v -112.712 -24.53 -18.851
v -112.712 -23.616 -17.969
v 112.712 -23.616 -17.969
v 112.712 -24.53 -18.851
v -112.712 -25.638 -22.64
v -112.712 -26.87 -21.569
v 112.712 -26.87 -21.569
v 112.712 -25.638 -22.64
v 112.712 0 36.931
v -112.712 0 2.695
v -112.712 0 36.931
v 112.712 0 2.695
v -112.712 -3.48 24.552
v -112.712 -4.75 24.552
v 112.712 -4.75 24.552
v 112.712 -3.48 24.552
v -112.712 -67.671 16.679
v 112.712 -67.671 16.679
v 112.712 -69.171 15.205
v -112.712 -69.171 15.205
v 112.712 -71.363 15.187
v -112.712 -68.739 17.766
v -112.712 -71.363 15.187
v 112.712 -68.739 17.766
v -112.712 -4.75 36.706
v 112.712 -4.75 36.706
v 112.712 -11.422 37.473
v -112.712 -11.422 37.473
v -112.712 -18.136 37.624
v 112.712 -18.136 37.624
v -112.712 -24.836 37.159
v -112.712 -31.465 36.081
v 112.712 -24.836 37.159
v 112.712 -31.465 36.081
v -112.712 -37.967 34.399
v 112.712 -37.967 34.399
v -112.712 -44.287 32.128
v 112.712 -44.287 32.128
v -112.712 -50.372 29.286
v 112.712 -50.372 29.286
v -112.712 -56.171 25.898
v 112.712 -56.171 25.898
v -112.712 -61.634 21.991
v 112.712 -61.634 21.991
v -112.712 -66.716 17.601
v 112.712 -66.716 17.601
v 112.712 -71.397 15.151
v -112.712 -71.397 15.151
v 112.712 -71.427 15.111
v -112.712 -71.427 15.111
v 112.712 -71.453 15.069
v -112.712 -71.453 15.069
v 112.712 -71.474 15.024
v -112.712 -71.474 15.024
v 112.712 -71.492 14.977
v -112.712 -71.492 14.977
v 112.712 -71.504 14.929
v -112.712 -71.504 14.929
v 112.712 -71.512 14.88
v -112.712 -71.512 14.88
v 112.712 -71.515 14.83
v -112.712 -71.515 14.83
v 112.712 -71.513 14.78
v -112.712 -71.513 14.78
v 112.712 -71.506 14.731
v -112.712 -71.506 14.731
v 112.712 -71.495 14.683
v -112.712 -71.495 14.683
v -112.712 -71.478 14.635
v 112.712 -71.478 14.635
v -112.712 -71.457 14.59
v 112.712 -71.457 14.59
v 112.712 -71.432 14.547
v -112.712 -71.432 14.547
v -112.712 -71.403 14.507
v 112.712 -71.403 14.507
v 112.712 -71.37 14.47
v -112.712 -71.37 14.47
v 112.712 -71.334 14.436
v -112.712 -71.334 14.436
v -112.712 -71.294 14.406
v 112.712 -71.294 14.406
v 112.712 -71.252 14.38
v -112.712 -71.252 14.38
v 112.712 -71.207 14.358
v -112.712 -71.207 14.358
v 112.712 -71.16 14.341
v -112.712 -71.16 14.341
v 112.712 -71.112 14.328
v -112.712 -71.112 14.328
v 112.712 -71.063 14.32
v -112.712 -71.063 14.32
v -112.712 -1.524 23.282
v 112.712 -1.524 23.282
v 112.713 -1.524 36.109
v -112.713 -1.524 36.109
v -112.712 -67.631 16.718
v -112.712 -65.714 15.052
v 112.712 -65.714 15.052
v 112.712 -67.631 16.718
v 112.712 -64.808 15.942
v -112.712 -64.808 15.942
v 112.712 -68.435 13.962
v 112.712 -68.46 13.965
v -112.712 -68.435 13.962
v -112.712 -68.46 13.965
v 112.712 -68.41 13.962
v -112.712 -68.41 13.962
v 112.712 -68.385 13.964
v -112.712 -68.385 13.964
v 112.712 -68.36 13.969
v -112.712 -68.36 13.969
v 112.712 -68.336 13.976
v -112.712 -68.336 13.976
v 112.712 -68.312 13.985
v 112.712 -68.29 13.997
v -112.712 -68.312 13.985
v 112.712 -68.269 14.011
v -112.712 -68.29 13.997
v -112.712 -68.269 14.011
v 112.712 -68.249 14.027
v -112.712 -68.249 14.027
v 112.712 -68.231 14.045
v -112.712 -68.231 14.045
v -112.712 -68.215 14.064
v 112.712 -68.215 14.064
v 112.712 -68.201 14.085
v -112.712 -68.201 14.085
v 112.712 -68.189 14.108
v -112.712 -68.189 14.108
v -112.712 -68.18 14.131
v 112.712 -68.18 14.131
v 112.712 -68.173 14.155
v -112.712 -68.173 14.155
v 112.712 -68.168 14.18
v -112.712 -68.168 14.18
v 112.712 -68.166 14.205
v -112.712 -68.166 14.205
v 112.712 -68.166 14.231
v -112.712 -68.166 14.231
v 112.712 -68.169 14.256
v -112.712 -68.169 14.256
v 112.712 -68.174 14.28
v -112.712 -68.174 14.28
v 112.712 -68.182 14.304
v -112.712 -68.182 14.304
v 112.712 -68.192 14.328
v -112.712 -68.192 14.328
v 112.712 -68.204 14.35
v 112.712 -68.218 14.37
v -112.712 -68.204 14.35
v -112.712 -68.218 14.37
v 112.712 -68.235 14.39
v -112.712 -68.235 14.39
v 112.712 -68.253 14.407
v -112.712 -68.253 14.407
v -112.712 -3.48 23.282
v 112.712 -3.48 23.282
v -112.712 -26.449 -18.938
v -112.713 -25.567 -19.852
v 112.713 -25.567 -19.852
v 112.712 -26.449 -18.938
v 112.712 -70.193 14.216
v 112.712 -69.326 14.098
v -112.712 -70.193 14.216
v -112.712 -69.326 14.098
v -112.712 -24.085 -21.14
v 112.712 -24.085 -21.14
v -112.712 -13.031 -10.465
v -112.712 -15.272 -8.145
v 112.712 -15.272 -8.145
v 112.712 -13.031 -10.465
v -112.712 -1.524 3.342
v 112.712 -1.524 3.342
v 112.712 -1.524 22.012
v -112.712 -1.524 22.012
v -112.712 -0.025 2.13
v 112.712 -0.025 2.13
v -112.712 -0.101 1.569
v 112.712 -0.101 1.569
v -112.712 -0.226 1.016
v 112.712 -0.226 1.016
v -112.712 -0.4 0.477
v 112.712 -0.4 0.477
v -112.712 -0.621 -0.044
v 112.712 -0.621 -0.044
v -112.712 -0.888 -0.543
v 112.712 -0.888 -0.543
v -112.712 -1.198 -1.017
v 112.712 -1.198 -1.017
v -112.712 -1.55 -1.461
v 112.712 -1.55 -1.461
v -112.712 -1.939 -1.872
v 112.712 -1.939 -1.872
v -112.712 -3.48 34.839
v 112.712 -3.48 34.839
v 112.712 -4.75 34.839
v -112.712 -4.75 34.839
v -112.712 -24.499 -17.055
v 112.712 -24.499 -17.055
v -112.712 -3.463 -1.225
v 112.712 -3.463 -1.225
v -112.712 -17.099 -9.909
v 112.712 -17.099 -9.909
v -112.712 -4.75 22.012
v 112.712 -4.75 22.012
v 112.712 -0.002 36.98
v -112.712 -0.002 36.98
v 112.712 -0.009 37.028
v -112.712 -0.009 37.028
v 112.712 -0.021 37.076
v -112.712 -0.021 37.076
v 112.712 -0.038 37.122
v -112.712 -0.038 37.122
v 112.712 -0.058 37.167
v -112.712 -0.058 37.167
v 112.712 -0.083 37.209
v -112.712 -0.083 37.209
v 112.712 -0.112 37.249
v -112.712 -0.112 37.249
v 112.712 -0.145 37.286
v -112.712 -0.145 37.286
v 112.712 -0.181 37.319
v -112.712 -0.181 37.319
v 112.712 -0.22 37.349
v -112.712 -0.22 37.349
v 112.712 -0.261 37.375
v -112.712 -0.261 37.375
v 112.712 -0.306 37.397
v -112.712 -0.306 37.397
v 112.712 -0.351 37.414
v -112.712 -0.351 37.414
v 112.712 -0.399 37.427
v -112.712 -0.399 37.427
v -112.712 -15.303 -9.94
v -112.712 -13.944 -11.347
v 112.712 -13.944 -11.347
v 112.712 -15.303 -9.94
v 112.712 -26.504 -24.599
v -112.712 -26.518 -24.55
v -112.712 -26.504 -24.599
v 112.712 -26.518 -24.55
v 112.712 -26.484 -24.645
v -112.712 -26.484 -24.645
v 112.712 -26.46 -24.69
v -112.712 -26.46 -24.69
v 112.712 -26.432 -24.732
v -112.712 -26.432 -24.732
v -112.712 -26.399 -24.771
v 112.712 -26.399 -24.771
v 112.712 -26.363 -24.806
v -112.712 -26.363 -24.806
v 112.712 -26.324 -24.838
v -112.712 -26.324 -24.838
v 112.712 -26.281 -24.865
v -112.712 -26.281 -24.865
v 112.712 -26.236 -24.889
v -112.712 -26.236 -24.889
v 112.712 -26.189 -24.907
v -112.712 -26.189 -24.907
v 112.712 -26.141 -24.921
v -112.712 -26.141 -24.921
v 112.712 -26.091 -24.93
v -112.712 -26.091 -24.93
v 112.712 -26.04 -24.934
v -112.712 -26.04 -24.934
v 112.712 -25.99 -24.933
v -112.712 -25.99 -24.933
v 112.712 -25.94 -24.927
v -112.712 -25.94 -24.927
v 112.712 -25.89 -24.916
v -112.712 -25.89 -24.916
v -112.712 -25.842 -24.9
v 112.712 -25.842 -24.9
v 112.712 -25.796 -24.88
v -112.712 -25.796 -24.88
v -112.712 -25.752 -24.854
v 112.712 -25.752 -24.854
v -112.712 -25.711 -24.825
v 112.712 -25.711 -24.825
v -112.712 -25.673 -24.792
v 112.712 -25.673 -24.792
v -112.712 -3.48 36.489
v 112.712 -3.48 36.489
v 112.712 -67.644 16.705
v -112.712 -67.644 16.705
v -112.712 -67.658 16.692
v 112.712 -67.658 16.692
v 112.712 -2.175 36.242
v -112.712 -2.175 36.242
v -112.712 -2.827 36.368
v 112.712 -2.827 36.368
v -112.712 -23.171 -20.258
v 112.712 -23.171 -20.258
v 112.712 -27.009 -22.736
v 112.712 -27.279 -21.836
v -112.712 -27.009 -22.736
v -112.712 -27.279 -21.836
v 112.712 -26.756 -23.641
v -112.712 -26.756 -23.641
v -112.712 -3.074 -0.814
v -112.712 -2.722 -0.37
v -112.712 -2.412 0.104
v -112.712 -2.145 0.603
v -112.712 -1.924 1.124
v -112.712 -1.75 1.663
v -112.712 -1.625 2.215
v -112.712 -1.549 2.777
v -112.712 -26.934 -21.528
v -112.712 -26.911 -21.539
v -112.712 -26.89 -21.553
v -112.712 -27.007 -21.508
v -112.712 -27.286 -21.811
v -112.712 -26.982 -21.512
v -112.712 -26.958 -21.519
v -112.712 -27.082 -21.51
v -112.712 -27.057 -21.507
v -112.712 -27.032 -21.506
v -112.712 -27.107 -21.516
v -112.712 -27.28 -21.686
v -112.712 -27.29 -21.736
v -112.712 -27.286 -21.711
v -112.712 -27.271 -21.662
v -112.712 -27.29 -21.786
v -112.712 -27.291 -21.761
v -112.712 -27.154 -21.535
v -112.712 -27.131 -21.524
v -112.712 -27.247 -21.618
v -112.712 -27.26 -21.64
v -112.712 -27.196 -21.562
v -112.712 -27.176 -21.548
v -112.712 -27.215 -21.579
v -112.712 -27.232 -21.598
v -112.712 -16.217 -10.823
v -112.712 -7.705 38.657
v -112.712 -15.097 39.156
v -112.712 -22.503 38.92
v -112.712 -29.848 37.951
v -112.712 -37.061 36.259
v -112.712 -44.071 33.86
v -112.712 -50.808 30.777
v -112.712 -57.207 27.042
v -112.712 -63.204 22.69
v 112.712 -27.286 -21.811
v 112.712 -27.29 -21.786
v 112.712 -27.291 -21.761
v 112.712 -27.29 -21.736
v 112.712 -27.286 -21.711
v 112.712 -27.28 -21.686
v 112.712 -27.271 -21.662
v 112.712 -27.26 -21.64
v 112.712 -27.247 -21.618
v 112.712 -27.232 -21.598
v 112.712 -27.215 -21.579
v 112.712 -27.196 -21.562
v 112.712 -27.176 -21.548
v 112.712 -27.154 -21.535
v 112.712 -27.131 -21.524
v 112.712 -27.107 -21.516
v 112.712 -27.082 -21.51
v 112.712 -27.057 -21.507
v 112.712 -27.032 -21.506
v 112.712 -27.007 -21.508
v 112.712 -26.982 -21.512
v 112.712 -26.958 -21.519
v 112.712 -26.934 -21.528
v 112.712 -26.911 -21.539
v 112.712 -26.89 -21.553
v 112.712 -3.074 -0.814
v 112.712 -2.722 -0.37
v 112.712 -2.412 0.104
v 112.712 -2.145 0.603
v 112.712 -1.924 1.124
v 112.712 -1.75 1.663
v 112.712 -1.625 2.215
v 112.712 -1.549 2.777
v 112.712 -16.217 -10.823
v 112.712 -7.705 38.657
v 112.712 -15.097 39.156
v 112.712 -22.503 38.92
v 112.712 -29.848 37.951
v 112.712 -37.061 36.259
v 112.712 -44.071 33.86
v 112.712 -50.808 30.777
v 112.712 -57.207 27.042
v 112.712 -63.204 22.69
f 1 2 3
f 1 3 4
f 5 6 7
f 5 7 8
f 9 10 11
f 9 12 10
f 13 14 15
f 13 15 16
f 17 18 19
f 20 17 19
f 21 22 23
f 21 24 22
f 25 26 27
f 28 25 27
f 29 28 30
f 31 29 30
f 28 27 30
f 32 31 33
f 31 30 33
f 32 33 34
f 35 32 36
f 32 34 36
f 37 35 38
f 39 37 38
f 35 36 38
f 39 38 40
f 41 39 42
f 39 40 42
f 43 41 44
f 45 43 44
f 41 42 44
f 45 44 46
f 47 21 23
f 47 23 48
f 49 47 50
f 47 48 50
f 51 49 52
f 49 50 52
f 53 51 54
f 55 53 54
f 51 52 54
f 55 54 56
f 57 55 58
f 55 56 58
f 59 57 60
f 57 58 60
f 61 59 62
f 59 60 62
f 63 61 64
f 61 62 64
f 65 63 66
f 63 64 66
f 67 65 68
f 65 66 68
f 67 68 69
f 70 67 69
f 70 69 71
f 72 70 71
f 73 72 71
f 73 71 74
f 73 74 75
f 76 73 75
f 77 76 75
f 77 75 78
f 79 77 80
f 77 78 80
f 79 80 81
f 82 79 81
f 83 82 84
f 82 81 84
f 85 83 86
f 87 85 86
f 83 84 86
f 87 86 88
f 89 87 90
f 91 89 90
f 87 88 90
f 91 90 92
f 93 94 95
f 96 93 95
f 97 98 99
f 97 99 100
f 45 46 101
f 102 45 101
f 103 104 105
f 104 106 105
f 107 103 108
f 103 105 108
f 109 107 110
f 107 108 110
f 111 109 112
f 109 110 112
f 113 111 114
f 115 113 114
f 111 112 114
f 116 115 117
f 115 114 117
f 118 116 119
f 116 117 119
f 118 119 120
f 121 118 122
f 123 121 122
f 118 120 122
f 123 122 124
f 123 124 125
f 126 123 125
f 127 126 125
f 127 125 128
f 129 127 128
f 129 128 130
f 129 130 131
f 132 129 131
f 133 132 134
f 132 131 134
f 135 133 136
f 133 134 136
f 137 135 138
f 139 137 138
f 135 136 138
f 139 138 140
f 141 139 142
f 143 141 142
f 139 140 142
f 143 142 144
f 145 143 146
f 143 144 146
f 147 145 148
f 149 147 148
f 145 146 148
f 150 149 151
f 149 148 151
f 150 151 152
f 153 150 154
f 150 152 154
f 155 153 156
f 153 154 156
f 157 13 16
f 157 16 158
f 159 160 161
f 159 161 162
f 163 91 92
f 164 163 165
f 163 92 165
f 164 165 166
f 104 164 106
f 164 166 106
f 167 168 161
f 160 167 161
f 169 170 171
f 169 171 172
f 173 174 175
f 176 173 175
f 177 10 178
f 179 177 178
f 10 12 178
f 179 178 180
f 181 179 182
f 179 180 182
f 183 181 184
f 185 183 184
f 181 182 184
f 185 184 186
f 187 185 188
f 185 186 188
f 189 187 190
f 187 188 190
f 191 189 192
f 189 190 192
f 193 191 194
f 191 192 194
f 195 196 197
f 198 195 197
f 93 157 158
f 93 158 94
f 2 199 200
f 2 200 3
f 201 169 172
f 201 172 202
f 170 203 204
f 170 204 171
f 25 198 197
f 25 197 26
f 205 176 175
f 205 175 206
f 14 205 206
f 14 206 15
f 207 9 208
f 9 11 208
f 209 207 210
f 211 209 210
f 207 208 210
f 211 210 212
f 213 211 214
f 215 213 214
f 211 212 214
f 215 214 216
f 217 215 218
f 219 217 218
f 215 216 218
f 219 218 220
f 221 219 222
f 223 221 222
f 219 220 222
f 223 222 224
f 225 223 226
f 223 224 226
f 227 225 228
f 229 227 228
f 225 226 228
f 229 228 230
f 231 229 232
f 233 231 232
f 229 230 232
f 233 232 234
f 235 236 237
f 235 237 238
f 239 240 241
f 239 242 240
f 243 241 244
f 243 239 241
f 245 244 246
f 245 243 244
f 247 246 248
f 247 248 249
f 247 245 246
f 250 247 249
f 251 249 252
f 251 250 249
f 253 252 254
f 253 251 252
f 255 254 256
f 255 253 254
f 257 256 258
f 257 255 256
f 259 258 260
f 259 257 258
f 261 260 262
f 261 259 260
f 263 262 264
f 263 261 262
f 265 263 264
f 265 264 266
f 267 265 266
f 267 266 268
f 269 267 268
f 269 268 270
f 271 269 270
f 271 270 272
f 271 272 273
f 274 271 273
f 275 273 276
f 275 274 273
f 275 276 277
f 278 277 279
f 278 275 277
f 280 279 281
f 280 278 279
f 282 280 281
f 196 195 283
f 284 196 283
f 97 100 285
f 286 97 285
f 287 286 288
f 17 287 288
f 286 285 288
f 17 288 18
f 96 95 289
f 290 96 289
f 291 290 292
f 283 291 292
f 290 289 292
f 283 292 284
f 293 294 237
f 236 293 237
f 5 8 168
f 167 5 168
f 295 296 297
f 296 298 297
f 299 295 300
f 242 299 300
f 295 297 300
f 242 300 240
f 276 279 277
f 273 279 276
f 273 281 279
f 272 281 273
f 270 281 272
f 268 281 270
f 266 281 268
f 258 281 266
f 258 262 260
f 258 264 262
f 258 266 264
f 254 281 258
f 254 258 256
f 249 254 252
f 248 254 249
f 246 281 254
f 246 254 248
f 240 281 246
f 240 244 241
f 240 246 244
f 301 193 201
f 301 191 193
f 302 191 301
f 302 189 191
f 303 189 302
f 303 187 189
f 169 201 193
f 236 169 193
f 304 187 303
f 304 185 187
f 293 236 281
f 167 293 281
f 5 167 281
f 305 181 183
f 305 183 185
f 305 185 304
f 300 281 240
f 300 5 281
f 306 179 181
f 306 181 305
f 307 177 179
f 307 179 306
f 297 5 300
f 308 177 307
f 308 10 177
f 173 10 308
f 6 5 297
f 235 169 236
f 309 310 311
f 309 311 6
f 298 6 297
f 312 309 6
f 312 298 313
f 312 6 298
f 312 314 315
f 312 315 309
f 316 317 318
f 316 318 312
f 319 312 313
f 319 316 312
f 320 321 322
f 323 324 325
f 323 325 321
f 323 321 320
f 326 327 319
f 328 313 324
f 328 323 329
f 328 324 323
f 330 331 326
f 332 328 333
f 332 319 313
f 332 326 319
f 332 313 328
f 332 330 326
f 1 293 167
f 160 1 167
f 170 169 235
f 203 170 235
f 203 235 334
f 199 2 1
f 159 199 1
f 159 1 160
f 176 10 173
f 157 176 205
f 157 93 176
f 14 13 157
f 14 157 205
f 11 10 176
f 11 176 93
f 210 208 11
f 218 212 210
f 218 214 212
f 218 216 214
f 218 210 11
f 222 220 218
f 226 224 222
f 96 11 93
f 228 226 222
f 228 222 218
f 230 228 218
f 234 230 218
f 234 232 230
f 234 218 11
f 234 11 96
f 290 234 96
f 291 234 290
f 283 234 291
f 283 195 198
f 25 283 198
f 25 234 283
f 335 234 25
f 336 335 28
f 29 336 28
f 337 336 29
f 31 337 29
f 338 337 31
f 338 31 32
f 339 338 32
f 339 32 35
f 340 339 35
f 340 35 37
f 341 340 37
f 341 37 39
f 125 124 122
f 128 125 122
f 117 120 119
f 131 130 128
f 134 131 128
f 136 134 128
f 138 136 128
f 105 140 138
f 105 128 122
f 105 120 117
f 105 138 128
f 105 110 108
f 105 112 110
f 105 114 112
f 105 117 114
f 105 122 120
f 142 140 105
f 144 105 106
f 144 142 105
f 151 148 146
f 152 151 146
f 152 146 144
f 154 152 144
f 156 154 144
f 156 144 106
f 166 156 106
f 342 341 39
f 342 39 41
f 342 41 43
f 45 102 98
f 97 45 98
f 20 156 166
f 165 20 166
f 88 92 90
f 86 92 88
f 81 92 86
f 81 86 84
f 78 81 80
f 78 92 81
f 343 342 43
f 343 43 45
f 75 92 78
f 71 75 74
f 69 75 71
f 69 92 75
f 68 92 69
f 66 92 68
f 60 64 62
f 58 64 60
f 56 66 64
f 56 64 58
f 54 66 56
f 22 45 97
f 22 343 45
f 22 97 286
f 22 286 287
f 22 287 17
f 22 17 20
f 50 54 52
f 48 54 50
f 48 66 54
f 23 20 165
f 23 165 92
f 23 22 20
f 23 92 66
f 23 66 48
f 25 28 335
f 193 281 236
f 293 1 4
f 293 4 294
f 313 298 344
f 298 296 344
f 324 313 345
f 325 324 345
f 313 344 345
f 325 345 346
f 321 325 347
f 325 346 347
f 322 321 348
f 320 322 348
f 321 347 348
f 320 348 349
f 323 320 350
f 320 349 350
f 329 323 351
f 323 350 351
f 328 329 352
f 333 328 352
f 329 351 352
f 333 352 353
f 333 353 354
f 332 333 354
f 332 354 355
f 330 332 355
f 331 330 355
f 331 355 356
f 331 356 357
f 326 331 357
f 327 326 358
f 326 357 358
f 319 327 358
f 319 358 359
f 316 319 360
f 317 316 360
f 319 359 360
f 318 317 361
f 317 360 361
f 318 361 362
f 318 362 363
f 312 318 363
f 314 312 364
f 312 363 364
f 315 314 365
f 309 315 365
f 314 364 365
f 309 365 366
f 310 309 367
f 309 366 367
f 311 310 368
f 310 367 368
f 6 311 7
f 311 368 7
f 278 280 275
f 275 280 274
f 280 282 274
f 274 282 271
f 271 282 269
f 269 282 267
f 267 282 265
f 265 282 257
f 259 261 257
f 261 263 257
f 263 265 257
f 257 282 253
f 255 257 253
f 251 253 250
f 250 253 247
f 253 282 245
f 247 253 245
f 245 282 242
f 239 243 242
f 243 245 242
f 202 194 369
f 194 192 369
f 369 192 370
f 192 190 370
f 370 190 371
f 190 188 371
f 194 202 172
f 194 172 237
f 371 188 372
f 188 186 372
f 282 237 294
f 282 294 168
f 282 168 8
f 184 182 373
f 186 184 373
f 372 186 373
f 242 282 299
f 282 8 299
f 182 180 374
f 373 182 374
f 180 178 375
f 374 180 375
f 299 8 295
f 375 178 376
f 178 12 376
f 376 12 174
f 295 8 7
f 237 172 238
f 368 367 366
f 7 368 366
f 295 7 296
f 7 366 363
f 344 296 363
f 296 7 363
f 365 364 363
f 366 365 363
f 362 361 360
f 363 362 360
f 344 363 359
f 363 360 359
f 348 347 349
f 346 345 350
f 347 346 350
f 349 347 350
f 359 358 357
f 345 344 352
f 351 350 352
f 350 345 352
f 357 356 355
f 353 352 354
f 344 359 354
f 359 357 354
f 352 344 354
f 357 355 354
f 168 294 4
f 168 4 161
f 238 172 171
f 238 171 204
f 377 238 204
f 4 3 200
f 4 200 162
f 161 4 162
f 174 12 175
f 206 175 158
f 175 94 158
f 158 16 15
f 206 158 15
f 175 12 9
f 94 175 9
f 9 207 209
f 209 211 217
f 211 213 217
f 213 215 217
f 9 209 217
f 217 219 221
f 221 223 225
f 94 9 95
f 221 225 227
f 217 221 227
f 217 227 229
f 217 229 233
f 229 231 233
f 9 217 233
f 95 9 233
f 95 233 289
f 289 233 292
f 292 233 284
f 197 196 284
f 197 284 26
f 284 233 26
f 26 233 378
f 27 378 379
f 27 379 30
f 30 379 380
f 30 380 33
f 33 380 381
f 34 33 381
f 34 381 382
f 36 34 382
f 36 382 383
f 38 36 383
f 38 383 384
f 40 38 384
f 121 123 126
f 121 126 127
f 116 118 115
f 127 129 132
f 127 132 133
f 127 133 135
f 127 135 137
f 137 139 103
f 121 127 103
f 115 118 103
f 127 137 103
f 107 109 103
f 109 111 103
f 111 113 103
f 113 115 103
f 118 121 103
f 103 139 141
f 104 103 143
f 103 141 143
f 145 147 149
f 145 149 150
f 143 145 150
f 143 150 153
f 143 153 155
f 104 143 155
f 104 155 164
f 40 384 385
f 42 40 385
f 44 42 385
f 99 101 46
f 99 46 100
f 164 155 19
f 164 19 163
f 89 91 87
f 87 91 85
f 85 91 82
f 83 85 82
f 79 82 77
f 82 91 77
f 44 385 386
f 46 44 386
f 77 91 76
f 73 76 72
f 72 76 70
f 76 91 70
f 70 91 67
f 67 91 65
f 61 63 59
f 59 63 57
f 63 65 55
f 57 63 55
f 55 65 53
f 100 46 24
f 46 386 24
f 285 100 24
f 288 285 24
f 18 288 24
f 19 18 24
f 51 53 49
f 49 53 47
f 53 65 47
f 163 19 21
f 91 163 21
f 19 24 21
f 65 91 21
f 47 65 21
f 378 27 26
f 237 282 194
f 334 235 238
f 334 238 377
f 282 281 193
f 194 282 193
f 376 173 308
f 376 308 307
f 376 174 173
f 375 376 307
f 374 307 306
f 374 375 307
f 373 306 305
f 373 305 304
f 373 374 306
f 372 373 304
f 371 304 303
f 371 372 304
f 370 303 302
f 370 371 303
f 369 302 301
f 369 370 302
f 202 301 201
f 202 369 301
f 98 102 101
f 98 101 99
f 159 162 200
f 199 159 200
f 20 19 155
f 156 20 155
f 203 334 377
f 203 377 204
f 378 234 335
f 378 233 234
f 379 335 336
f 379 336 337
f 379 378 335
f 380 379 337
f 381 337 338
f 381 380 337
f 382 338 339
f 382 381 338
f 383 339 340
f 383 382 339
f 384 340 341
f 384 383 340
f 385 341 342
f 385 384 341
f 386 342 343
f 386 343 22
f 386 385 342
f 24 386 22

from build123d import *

# Parameters (mm, degrees)
F1_DEPTH  = 112.7125
F2_T      = -1.524
F5_DEPTH  = 225.425
F7_DEPTH  = 225.425
F8_R      = 51.8099901909
F9_DEPTH  = 225.425
F14_W     = 1.27
F14_H     = 1.8664713708
F15_DEPTH = 225.425
F16_R     = 0.508
F17_R     = 6.35
F18_R     = 0.254


with BuildPart() as f1:
    # F0 (on Right) → F1 (new body, symmetric)
    with BuildSketch(Plane.YZ):
        with BuildLine():
            Line((-72.136, 14.4276117903), (-26.3105725372, -25.4078245579))
            Line((-26.3105725372, -25.4078245579), (0, 0))
            Line((0, 0), (0, 37.338))
            ThreePointArc((0, 37.338), (-36.8647965725, 36.3151722047), (-68.7392263709, 17.7657752319))
            Line((-68.7392263709, 17.7657752319), (-72.136, 14.4276117903))
        make_face()
    extrude(amount=F1_DEPTH, both=True)

    # F2
    f2_openings = [f1.faces().sort_by_distance(p)[0] for p in [
        (0, -49.223286, -5.490106),
        (-112.7125, -29.609995, 11.681685),
        (112.7125, -29.609995, 11.681685),
    ]]
    offset(amount=F2_T, openings=f2_openings)

    # F4 (on face) → F5 (join, through all)
    with BuildSketch(Plane(origin=(-112.7125, 0, 0), x_dir=(0, -1, 0), z_dir=(-1, 0, 0))):
        Polygon((69.0653059094, 11.7582981414), (70.9822682431, 13.424688075), (69.170655641, 15.2050419106), (67.2536933072, 13.5386519769), align=None)
    extrude(amount=-F5_DEPTH)

    # F6 (on face) → F7 (join, through all)
    with BuildSketch(Plane(origin=(-112.7125, 0, 0), x_dir=(0, -1, 0), z_dir=(-1, 0, 0))):
        Polygon((27.5549826692, -20.9733491998), (25.6380203354, -22.6397391335), (27.4651434283, -24.4041713944), (29.382105762, -22.7377814608), align=None)
    extrude(amount=-F7_DEPTH)

    # F8 (on face) → F9 (cut, through all)
    with BuildSketch(Plane(origin=(-112.7125, 0, 0), x_dir=(0, -1, 0), z_dir=(-1, 0, 0))):
        with Locations((76.7665722185, -37.1750323717)):
            Circle(F8_R)
    extrude(amount=-F9_DEPTH, mode=Mode.SUBTRACT)

    # F10 (on face) + F11 (on face) + F12 (on face) + F13 (on face) + F14 (on face) → F15 (join, through all)
    with BuildSketch(Plane(origin=(-112.7125, 0, 0), x_dir=(0, -1, 0), z_dir=(-1, 0, 0))):
        Polygon((23.17140416, -20.2577555812), (24.0849657065, -21.1399717116), (25.5666650167, -19.8519501518), (24.530017001, -18.8508707997), align=None)
    with BuildSketch(Plane(origin=(-112.7125, 0, 0), x_dir=(0, -1, 0), z_dir=(-1, 0, 0))):
        Polygon((23.6164554546, -17.9686546692), (25.5666650167, -19.8519501518), (26.4488811472, -18.9383886054), (24.498671585, -17.0550931227), align=None)
    with BuildSketch(Plane(origin=(-112.7125, 0, 0), x_dir=(0, -1, 0), z_dir=(-1, 0, 0))):
        Polygon((65.7138225954, 15.0519527371), (67.6307849291, 16.7183426707), (66.724978628, 17.6085195885), (64.8080162943, 15.9421296549), align=None)
    with BuildSketch(Plane(origin=(-112.7125, 0, 0), x_dir=(0, -1, 0), z_dir=(-1, 0, 0))):
        Polygon((13.0308709947, -10.4651565328), (13.9444325411, -11.3473726633), (15.303045382, -9.9404878818), (16.2166069285, -10.8227040123), (17.098823059, -9.9091424658), (15.2716999661, -8.1447102049), align=None)
    with BuildSketch(Plane(origin=(-112.7125, 0, 0), x_dir=(0, -1, 0), z_dir=(-1, 0, 0))):
        Polygon((1.524, 23.2821790422), (1.524, 22.0121790422), (4.7498, 22.0121790422), (4.7498, 24.5521790422), (3.4798, 24.5521790422), (3.4798, 23.2821790422), align=None)
        with Locations((4.1148, 35.7724147276)):
            Rectangle(F14_W, F14_H)
    extrude(amount=-F15_DEPTH)

    # F16
    f16_edges = [f1.edges().sort_by_distance(p)[0] for p in [
        (0, -26.310573, -25.407825),
        (0, -72.136, 14.427612),
        (0, 0, 37.338),
    ]]
    fillet(f16_edges, radius=F16_R)

    # F17
    f17_edges = [f1.edges().sort_by_distance(p)[0] for p in [
        (0, -1.524, 0.6469),
        (0, 0, 0),
    ]]
    fillet(f17_edges, radius=F17_R)

    # F18
    f18_edges = [f1.edges().sort_by_distance(p)[0] for p in [
        (0, -27.554983, -20.973349),
        (0, -67.567953, 13.811833),
    ]]
    fillet(f18_edges, radius=F18_R)


solid = f1.part
